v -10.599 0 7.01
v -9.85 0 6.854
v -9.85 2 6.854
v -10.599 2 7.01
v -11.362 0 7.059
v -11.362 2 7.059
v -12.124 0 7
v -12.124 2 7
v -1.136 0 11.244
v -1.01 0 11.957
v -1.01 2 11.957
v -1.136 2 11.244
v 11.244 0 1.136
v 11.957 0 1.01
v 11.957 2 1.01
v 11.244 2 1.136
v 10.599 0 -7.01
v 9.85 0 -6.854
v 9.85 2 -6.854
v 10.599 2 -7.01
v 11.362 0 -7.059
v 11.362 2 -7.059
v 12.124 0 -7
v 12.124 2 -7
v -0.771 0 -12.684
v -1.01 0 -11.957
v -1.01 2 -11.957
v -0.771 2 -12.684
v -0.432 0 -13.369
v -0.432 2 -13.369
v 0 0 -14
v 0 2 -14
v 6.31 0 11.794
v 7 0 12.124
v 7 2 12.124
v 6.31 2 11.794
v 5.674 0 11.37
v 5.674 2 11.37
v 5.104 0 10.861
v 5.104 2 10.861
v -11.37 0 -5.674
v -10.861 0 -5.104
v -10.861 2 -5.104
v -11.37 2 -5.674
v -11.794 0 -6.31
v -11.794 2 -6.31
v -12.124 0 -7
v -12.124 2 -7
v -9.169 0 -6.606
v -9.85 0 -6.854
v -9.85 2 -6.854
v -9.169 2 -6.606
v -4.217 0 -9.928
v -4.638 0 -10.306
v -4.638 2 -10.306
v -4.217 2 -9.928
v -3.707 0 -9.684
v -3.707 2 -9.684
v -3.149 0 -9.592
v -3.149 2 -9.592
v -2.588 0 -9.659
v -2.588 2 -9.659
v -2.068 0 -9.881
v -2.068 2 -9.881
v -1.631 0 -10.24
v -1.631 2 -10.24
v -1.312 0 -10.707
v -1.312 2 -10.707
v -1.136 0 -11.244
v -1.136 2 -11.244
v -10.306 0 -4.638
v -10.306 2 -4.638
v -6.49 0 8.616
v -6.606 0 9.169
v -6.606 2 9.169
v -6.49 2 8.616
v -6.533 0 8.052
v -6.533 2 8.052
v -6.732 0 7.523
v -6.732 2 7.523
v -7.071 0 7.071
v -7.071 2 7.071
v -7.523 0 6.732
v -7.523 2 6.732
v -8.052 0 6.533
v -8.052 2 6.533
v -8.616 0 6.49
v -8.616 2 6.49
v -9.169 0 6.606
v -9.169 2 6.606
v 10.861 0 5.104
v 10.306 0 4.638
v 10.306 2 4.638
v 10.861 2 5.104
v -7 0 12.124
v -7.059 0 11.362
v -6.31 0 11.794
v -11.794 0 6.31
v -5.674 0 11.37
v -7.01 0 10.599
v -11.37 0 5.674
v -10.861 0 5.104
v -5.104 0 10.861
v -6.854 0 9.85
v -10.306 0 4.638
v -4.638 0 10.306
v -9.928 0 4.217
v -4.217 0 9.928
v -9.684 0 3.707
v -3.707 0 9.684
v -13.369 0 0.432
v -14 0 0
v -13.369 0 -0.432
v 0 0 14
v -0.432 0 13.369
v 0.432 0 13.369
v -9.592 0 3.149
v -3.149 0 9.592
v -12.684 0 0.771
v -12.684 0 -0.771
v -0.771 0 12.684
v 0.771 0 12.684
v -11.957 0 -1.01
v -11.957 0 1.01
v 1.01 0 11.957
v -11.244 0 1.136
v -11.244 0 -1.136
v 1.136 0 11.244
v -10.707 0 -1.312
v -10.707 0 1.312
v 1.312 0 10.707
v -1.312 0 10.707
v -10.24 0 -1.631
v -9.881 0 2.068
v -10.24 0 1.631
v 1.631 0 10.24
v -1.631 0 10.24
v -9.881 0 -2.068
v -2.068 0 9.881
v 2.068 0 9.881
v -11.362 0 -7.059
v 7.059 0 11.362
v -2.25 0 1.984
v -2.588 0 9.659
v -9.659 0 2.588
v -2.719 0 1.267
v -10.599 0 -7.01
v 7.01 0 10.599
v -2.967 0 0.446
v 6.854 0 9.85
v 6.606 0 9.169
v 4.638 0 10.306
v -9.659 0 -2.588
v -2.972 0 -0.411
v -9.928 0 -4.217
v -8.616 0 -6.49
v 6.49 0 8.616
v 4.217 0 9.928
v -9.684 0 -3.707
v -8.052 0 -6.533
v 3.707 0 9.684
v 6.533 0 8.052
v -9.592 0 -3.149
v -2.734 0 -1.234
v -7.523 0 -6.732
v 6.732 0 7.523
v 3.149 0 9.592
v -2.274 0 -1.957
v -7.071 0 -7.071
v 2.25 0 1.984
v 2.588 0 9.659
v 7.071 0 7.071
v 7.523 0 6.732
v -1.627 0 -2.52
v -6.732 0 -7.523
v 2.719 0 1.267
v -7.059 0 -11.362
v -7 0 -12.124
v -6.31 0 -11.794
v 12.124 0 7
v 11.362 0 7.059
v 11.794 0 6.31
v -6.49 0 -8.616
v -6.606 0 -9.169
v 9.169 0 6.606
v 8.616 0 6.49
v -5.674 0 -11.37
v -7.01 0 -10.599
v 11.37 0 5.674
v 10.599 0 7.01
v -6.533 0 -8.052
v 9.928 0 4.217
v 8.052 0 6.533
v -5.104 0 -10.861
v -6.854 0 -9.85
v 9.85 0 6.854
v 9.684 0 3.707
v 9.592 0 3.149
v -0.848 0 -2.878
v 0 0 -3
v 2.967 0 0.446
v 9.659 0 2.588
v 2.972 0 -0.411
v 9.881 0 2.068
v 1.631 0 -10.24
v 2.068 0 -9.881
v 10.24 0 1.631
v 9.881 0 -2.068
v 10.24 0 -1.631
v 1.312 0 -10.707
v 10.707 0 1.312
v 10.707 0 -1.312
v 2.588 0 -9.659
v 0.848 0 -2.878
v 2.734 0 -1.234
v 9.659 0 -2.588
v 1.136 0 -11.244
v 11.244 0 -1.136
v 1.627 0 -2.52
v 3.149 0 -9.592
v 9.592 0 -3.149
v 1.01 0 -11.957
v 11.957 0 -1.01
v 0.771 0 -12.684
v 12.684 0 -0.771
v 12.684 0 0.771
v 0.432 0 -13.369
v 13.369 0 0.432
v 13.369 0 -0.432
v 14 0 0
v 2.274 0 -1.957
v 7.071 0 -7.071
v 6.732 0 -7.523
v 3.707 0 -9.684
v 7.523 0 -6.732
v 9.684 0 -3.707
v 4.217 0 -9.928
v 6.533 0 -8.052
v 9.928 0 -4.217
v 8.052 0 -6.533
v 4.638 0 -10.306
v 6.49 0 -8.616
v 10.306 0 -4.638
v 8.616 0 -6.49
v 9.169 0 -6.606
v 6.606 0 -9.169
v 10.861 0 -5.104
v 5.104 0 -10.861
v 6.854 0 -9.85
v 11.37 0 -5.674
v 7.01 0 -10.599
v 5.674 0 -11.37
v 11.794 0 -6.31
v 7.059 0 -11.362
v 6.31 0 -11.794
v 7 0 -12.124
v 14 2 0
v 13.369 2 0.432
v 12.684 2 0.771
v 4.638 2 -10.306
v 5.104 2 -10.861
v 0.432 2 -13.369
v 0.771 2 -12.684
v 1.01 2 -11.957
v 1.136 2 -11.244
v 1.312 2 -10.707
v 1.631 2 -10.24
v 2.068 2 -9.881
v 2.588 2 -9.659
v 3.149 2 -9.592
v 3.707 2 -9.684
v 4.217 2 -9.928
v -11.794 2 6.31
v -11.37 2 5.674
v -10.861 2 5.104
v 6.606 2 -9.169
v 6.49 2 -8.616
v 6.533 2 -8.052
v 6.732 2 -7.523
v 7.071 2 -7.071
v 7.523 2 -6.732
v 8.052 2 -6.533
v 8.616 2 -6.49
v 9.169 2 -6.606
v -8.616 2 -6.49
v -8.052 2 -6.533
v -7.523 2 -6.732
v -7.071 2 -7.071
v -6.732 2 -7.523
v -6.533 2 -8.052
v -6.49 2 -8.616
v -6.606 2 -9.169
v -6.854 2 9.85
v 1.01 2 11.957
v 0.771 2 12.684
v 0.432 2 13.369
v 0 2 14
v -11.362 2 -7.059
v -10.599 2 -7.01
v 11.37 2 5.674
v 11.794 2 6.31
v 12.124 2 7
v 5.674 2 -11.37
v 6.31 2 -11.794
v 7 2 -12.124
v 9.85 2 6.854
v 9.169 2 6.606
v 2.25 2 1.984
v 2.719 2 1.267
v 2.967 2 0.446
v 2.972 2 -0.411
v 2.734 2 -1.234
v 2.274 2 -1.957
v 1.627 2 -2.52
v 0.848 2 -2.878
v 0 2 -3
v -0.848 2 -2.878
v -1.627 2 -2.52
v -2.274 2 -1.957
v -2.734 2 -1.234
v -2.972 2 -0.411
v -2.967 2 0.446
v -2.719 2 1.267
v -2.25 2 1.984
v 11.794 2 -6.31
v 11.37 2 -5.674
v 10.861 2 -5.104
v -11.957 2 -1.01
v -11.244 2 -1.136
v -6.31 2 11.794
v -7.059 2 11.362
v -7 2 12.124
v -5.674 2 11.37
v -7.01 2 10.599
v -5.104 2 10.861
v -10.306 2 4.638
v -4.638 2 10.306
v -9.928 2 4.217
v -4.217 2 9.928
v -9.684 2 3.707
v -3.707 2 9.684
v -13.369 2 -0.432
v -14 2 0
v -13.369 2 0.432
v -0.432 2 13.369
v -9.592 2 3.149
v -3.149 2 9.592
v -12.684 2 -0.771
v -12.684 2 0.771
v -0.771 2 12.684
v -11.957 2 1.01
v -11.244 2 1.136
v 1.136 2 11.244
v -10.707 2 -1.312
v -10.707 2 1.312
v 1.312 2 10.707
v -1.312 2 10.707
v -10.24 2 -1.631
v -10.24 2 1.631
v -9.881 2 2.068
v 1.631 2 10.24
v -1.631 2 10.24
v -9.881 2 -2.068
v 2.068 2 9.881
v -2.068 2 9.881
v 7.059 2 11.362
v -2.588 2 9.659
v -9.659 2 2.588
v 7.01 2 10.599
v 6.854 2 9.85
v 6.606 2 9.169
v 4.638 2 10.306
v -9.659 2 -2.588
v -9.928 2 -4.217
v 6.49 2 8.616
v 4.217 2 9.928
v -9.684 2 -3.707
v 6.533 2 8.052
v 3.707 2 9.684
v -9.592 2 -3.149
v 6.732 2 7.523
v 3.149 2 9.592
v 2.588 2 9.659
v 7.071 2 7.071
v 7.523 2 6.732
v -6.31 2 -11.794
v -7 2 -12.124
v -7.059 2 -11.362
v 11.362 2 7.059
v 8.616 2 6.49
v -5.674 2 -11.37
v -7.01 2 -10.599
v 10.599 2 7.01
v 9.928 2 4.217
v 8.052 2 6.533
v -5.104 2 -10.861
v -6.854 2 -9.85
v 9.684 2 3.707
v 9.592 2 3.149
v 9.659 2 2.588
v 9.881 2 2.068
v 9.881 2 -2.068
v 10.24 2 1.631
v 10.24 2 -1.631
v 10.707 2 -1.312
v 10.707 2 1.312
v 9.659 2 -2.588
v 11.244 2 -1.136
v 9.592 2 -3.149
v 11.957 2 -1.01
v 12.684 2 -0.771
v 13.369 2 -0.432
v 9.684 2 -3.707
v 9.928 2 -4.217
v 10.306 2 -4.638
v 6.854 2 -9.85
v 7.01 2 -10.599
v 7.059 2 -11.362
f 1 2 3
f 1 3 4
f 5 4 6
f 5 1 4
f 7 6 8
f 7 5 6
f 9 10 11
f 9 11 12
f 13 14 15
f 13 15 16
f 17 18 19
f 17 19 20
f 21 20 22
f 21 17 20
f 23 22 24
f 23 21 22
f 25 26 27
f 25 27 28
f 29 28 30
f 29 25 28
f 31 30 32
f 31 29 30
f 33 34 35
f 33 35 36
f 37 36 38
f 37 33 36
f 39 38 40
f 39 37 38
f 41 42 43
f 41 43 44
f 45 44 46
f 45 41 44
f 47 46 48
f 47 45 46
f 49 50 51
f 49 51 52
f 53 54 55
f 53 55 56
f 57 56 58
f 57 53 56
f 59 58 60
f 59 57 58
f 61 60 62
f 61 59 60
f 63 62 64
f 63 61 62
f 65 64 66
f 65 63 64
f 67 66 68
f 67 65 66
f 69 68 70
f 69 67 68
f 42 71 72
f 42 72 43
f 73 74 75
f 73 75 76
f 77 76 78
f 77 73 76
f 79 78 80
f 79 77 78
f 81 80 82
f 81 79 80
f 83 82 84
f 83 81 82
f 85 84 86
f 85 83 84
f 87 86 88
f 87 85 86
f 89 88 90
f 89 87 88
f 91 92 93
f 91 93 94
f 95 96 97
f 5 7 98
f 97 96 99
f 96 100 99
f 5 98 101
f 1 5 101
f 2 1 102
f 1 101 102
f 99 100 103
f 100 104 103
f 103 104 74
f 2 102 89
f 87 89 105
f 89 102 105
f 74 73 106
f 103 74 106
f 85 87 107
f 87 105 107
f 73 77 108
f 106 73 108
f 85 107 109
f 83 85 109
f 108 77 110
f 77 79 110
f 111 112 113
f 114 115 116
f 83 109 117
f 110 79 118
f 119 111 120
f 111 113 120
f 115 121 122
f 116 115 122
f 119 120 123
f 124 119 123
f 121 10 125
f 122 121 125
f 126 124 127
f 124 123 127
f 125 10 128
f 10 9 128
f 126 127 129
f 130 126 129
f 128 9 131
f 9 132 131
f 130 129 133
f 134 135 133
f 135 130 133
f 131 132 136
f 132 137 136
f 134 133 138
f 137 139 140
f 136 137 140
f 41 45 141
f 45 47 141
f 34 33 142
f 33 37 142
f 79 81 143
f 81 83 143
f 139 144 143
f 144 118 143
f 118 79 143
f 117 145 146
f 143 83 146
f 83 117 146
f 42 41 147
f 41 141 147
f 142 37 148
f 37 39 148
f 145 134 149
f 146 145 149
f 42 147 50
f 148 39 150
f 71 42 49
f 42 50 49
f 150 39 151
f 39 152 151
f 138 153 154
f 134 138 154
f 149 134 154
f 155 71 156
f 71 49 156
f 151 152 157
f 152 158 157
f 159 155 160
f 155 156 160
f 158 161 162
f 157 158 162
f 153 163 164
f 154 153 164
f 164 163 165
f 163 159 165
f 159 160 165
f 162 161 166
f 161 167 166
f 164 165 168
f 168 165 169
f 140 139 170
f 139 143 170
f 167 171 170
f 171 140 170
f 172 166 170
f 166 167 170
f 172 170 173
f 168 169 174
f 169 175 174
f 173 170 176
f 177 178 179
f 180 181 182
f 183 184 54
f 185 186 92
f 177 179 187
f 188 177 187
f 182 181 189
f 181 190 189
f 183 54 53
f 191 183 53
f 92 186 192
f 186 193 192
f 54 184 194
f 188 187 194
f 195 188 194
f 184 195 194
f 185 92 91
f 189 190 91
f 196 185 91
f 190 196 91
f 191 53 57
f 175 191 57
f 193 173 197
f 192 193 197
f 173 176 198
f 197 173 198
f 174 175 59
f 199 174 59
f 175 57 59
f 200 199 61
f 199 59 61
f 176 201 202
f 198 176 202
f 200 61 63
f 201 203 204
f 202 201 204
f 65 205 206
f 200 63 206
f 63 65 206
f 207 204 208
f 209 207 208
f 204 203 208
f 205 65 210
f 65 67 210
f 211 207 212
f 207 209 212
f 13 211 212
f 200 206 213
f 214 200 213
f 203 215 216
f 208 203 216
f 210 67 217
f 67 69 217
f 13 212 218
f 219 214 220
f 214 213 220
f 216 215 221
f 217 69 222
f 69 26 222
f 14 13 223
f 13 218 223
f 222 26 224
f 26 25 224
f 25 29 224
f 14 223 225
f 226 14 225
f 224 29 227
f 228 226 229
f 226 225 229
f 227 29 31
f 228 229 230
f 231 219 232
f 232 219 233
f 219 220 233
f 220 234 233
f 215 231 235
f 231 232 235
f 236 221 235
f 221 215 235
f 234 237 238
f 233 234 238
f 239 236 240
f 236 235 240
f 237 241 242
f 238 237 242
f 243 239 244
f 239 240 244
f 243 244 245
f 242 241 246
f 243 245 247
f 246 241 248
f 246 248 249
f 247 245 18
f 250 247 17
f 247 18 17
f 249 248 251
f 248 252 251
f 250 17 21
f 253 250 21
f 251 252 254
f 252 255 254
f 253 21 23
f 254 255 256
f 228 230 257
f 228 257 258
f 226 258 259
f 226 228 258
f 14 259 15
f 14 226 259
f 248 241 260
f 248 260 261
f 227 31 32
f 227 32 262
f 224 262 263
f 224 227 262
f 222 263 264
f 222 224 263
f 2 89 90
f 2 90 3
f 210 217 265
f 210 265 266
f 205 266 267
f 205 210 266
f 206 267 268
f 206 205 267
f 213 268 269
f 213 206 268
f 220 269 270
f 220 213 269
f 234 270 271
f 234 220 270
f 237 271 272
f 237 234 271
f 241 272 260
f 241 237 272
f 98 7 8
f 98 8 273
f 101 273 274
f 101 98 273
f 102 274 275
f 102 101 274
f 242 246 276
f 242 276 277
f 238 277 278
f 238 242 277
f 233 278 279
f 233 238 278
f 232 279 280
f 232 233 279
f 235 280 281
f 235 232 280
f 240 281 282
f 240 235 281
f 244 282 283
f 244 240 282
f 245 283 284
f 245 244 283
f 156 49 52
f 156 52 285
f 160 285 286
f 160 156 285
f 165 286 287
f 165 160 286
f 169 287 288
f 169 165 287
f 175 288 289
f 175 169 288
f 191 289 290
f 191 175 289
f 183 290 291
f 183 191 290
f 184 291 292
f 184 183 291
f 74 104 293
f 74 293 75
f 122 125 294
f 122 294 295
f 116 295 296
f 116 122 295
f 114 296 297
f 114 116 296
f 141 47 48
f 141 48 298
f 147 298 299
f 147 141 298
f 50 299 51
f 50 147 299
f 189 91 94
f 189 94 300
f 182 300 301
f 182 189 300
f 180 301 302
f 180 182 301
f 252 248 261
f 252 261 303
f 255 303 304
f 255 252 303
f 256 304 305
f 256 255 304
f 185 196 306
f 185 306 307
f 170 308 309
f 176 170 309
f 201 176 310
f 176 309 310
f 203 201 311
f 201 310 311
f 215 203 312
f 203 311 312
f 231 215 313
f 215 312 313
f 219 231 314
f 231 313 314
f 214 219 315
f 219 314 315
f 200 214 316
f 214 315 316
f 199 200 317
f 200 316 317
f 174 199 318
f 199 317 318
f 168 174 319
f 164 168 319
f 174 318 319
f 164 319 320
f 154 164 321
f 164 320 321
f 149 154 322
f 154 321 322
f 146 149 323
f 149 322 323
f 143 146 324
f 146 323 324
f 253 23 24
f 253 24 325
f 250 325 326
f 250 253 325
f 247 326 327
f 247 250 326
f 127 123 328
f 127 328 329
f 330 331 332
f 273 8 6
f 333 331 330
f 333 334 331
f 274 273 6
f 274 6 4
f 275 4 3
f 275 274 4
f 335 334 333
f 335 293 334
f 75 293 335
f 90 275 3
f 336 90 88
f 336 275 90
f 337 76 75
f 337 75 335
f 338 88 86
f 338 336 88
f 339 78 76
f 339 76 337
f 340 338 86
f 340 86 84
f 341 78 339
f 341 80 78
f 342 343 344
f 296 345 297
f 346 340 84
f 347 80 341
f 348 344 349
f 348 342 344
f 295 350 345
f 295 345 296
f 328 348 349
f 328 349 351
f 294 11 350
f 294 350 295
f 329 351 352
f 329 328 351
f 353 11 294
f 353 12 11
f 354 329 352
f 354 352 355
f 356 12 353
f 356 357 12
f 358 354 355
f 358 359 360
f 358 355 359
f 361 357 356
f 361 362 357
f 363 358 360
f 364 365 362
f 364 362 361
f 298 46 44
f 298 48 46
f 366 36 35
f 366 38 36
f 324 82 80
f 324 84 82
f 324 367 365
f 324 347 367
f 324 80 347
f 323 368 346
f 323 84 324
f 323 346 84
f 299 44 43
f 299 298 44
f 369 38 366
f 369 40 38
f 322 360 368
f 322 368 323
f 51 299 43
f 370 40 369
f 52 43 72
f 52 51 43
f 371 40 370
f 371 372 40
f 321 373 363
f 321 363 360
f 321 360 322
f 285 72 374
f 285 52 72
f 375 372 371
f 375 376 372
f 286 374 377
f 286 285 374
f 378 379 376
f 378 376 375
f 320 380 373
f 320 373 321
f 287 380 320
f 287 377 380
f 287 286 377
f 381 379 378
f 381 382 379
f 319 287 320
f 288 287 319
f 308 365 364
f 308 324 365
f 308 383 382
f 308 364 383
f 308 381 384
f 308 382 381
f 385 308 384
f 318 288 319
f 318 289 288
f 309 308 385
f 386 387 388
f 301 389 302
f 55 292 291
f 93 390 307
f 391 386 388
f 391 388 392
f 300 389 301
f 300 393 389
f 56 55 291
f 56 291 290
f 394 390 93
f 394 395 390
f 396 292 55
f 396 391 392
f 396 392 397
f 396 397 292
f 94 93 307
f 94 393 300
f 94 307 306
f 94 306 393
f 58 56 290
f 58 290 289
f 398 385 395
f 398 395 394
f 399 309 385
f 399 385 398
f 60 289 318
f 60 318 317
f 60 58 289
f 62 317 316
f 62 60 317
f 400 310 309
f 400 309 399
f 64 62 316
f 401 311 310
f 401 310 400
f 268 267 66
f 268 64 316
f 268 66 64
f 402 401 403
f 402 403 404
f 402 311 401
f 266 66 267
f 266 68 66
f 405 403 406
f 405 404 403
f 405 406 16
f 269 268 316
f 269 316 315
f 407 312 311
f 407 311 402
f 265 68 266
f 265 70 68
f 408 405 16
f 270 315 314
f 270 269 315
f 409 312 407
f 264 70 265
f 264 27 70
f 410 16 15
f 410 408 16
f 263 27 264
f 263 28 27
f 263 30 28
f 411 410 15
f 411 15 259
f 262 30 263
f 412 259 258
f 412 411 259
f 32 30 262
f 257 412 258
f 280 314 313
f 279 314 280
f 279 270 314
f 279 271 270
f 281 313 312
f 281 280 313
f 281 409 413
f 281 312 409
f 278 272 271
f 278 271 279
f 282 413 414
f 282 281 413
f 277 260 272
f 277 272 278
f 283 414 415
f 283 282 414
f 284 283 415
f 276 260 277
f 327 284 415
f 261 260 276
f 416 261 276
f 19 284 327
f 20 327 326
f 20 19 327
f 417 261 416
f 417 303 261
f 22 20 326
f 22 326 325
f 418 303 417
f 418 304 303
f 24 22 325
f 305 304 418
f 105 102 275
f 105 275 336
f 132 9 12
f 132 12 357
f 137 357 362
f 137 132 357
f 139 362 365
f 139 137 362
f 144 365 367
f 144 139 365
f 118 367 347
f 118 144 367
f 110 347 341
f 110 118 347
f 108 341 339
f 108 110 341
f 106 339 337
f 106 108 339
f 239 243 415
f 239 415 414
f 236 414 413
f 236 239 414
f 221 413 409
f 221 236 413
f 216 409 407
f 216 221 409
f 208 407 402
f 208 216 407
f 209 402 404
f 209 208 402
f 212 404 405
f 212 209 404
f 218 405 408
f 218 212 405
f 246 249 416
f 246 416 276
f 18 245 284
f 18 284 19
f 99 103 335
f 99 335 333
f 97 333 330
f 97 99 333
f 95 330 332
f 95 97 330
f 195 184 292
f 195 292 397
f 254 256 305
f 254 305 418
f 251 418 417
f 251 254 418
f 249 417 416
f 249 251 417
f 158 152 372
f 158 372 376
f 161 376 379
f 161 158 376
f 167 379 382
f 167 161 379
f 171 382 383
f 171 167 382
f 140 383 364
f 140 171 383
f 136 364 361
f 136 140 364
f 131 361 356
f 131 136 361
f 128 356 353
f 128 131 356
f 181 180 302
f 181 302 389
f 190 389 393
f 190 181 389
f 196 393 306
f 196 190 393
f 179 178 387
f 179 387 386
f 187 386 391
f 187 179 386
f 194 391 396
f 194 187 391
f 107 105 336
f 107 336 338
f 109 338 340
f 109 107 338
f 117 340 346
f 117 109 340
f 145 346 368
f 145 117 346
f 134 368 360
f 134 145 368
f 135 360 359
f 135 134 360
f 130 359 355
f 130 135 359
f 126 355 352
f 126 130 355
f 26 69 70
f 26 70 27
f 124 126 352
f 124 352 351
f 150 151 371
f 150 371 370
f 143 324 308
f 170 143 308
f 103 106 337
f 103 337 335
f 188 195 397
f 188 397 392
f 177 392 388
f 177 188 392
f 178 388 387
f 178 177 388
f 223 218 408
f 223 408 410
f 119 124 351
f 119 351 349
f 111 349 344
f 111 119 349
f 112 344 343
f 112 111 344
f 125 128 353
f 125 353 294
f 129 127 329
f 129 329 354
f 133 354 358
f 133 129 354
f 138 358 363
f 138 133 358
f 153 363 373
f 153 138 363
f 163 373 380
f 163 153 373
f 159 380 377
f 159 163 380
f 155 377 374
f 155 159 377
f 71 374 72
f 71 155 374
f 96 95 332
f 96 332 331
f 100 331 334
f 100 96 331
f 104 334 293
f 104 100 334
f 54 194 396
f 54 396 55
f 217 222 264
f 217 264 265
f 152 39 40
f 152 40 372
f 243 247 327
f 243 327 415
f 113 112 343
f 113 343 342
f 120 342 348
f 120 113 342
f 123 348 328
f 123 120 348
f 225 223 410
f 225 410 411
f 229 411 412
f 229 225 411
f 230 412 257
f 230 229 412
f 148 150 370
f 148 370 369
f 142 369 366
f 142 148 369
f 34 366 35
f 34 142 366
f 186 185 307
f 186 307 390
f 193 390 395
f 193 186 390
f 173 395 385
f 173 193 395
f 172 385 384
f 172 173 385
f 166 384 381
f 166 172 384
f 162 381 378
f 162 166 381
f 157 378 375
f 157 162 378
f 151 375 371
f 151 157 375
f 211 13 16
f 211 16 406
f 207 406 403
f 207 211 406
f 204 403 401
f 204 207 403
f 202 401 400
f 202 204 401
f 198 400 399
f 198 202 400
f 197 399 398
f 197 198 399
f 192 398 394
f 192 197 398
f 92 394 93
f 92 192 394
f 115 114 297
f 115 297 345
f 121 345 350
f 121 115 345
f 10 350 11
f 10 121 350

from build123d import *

# Parameters (mm, degrees)
SKETCH1_R           = 10
BOSS_EXTRUDE3_DEPTH = 2
CUT_EXTRUDE4_START  = -2
CUT_EXTRUDE4_DEPTH  = 2
CUT_EXTRUDE5_DEPTH  = 2
CUT_EXTRUDE7_START  = -2
CUT_EXTRUDE7_DEPTH  = 2


with BuildPart() as part:
    # Sketch1 → Boss-Extrude3 (new body)
    # profile 1 of 3: a face of its own
    with BuildSketch(Plane(origin=(0, 0, 0), x_dir=(1, 0, 0), z_dir=(0, 1, 0))):
        with BuildLine():
            ThreePointArc((-2.576546391, 9.66237076), (-3.696714803, 9.688501423), (-4.6270391, 10.312966622))
            Line((-4.6270391, 10.312966622), (-5.089759275, 10.867122458))
            add(Edge.make_bspline(
                [(-5.089759275, 10.867122458), (-6.64901802, 12.325915574), (-6.970753087, 12.141194398)],
                knots=[0, 0, 0, 1, 1, 1], degree=2, weights=[1, 1.687053572, 1]))
            ThreePointArc((-6.970753087, 12.141194398), (-7.014608214, -12.115909855), (14, 0))
            ThreePointArc((14, 0), (9.899494937, 9.899494937), (0, 14))
            add(Edge.make_bspline(
                [(-0.996876474, 11.958521535), (-0.370992408, 14), (0, 14)],
                knots=[0, 0, 0, 1, 1, 1], degree=2, weights=[1, 1.687053572, 1]))
            Line((-0.996876474, 11.958521535), (-1.122240194, 11.247548548))
            ThreePointArc((-1.122240194, 11.247548548), (-1.618115564, 10.242776114), (-2.576546391, 9.66237076))
        make_face()
        with BuildLine():
            ThreePointArc((10, 0), (-6.092394278, -7.9298633), (-2.576546391, 9.66237076))
            ThreePointArc((-2.576546391, 9.66237076), (6.092394278, 7.9298633), (10, 0))
        make_face(mode=Mode.SUBTRACT)
    # profile 2 of 3: a face of its own
    with BuildSketch(Plane(origin=(0, 0, 0), x_dir=(1, 0, 0), z_dir=(0, 1, 0))):
        Circle(SKETCH1_R)
    # profile 3 of 3: a face of its own
    with BuildSketch(Plane(origin=(0, 0, 0), x_dir=(1, 0, 0), z_dir=(0, 1, 0))):
        with BuildLine():
            Line((-5.089759275, 10.867122458), (-4.6270391, 10.312966622))
            ThreePointArc((-4.6270391, 10.312966622), (-3.696714803, 9.688501423), (-2.576546391, 9.66237076))
            ThreePointArc((-2.576546391, 9.66237076), (-1.618115564, 10.242776114), (-1.122240194, 11.247548548))
            Line((-1.122240194, 11.247548548), (-0.996876474, 11.958521535))
            add(Edge.make_bspline(
                [(-0.996876474, 11.958521535), (-0.370992408, 14), (0, 14)],
                knots=[0, 0, 0, 1, 1, 1], degree=2, weights=[1, 1.687053572, 1]))
            ThreePointArc((0, 14), (-3.607164983, 13.527319054), (-6.970753087, 12.141194398))
            add(Edge.make_bspline(
                [(-5.089759275, 10.867122458), (-6.64901802, 12.325915574), (-6.970753087, 12.141194398)],
                knots=[0, 0, 0, 1, 1, 1], degree=2, weights=[1, 1.687053572, 1]))
        make_face()
    extrude(amount=BOSS_EXTRUDE3_DEPTH)

    # Sketch2 → Cut-Extrude4 (cut)
    with BuildSketch(Plane(origin=(0, 2, 0), x_dir=(1, 0, 0), z_dir=(0, 1, 0)).offset(CUT_EXTRUDE4_START)):
        with BuildLine():
            Line((-1.136213035, 11.24381356), (-1.010390736, 11.95738728))
            ThreePointArc((-1.010390736, 11.95738728), (-0.613638742, 13.032335811), (0, 14))
            ThreePointArc((0, 14), (-3.623466631, 13.522961568), (-7, 12.124355653))
            ThreePointArc((-7, 12.124355653), (-5.984741166, 11.593153253), (-5.103669595, 10.860596515))
            Line((-5.103669595, 10.860596515), (-4.637917427, 10.305534696))
            ThreePointArc((-4.637917427, 10.305534696), (-2.588190451, 9.659258263), (-1.136213035, 11.24381356))
        make_face()
    extrude(amount=CUT_EXTRUDE4_DEPTH, mode=Mode.SUBTRACT)

    # Sketch3 → Cut-Extrude5 (cut)
    with BuildSketch(Plane(origin=(0, 2, 0), x_dir=(1, 0, 0), z_dir=(0, 1, 0))):
        with BuildLine():
            Line((-2.25, -1.984313483), (2.25, -1.984313483))
            ThreePointArc((2.25, -1.984313483), (0, 3), (-2.25, -1.984313483))
        make_face()
    extrude(amount=-CUT_EXTRUDE5_DEPTH, mode=Mode.SUBTRACT)

    # Sketch2<5> → Cut-Extrude7 (cut)
    with BuildSketch(Plane(origin=(0, 2, 0), x_dir=(1, 0, 0), z_dir=(0, 1, 0)).offset(CUT_EXTRUDE7_START)):
        with BuildLine():
            ThreePointArc((7, 12.124355653), (3.623466631, 13.522961568), (0, 14))
            ThreePointArc((0, 14), (0.613638742, 13.032335811), (1.010390736, 11.95738728))
            Line((1.010390736, 11.95738728), (1.136213035, 11.24381356))
            ThreePointArc((1.136213035, 11.24381356), (2.588190451, 9.659258263), (4.637917427, 10.305534696))
            Line((4.637917427, 10.305534696), (5.103669595, 10.860596515))
            ThreePointArc((5.103669595, 10.860596515), (5.984741166, 11.593153253), (7, 12.124355653))
        make_face()
        with BuildLine():
            ThreePointArc((12.124355653, 7), (9.899494937, 9.899494937), (7, 12.124355653))
            ThreePointArc((7, 12.124355653), (7.047594644, 10.979514512), (6.853717685, 9.850205779))
            Line((6.853717685, 9.850205779), (6.605896133, 9.169321661))
            ThreePointArc((6.605896133, 9.169321661), (7.071067812, 7.071067812), (9.169321661, 6.605896133))
            Line((9.169321661, 6.605896133), (9.850205779, 6.853717685))
            ThreePointArc((9.850205779, 6.853717685), (10.979514512, 7.047594644), (12.124355653, 7))
        make_face()
        with BuildLine():
            ThreePointArc((14, 0), (13.522961568, 3.623466631), (12.124355653, 7))
            ThreePointArc((12.124355653, 7), (11.593153253, 5.984741166), (10.860596515, 5.103669595))
            Line((10.860596515, 5.103669595), (10.305534696, 4.637917427))
            ThreePointArc((10.305534696, 4.637917427), (9.659258263, 2.588190451), (11.24381356, 1.136213035))
            Line((11.24381356, 1.136213035), (11.95738728, 1.010390736))
            ThreePointArc((11.95738728, 1.010390736), (13.032335811, 0.613638742), (14, 0))
        make_face()
        with BuildLine():
            ThreePointArc((-6.853717685, 9.850205779), (-7.047594644, 10.979514512), (-7, 12.124355653))
            ThreePointArc((-7, 12.124355653), (-9.899494937, 9.899494937), (-12.124355653, 7))
            ThreePointArc((-12.124355653, 7), (-10.979514512, 7.047594644), (-9.850205779, 6.853717685))
            Line((-9.850205779, 6.853717685), (-9.169321661, 6.605896133))
            ThreePointArc((-9.169321661, 6.605896133), (-7.071067812, 7.071067812), (-6.605896133, 9.169321661))
            Line((-6.605896133, 9.169321661), (-6.853717685, 9.850205779))
        make_face()
        with BuildLine():
            ThreePointArc((12.124355653, -7), (13.522961568, -3.623466631), (14, 0))
            ThreePointArc((14, 0), (13.032335811, -0.613638742), (11.95738728, -1.010390736))
            Line((11.95738728, -1.010390736), (11.24381356, -1.136213035))
            ThreePointArc((11.24381356, -1.136213035), (9.659258263, -2.588190451), (10.305534696, -4.637917427))
            Line((10.305534696, -4.637917427), (10.860596515, -5.103669595))
            ThreePointArc((10.860596515, -5.103669595), (11.593153253, -5.984741166), (12.124355653, -7))
        make_face()
        with BuildLine():
            ThreePointArc((-10.860596515, 5.103669595), (-11.593153253, 5.984741166), (-12.124355653, 7))
            ThreePointArc((-12.124355653, 7), (-13.522961568, 3.623466631), (-14, 0))
            ThreePointArc((-14, 0), (-13.032335811, 0.613638742), (-11.95738728, 1.010390736))
            Line((-11.95738728, 1.010390736), (-11.24381356, 1.136213035))
            ThreePointArc((-11.24381356, 1.136213035), (-9.659258263, 2.588190451), (-10.305534696, 4.637917427))
            Line((-10.305534696, 4.637917427), (-10.860596515, 5.103669595))
        make_face()
        with BuildLine():
            ThreePointArc((7, -12.124355653), (9.899494937, -9.899494937), (12.124355653, -7))
            ThreePointArc((12.124355653, -7), (10.979514512, -7.047594644), (9.850205779, -6.853717685))
            Line((9.850205779, -6.853717685), (9.169321661, -6.605896133))
            ThreePointArc((9.169321661, -6.605896133), (7.071067812, -7.071067812), (6.605896133, -9.169321661))
            Line((6.605896133, -9.169321661), (6.853717685, -9.850205779))
            ThreePointArc((6.853717685, -9.850205779), (7.047594644, -10.979514512), (7, -12.124355653))
        make_face()
        with BuildLine():
            ThreePointArc((-11.95738728, -1.010390736), (-13.032335811, -0.613638742), (-14, 0))
            ThreePointArc((-14, 0), (-13.522961568, -3.623466631), (-12.124355653, -7))
            ThreePointArc((-12.124355653, -7), (-11.593153253, -5.984741166), (-10.860596515, -5.103669595))
            Line((-10.860596515, -5.103669595), (-10.305534696, -4.637917427))
            ThreePointArc((-10.305534696, -4.637917427), (-9.659258263, -2.588190451), (-11.24381356, -1.136213035))
            Line((-11.24381356, -1.136213035), (-11.95738728, -1.010390736))
        make_face()
        with BuildLine():
            ThreePointArc((0, -14), (3.623466631, -13.522961568), (7, -12.124355653))
            ThreePointArc((7, -12.124355653), (5.984741166, -11.593153253), (5.103669595, -10.860596515))
            Line((5.103669595, -10.860596515), (4.637917427, -10.305534696))
            ThreePointArc((4.637917427, -10.305534696), (2.588190451, -9.659258263), (1.136213035, -11.24381356))
            Line((1.136213035, -11.24381356), (1.010390736, -11.95738728))
            ThreePointArc((1.010390736, -11.95738728), (0.613638742, -13.032335811), (0, -14))
        make_face()
        with BuildLine():
            ThreePointArc((-9.850205779, -6.853717685), (-10.979514512, -7.047594644), (-12.124355653, -7))
            ThreePointArc((-12.124355653, -7), (-9.899494937, -9.899494937), (-7, -12.124355653))
            ThreePointArc((-7, -12.124355653), (-7.047594644, -10.979514512), (-6.853717685, -9.850205779))
            Line((-6.853717685, -9.850205779), (-6.605896133, -9.169321661))
            ThreePointArc((-6.605896133, -9.169321661), (-7.071067812, -7.071067812), (-9.169321661, -6.605896133))
            Line((-9.169321661, -6.605896133), (-9.850205779, -6.853717685))
        make_face()
        with BuildLine():
            ThreePointArc((-7, -12.124355653), (-3.623466631, -13.522961568), (0, -14))
            ThreePointArc((0, -14), (-0.613638742, -13.032335811), (-1.010390736, -11.95738728))
            Line((-1.010390736, -11.95738728), (-1.136213035, -11.24381356))
            ThreePointArc((-1.136213035, -11.24381356), (-2.588190451, -9.659258263), (-4.637917427, -10.305534696))
            Line((-4.637917427, -10.305534696), (-5.103669595, -10.860596515))
            ThreePointArc((-5.103669595, -10.860596515), (-5.984741166, -11.593153253), (-7, -12.124355653))
        make_face()
    extrude(amount=CUT_EXTRUDE7_DEPTH, mode=Mode.SUBTRACT)


solid = part.part
